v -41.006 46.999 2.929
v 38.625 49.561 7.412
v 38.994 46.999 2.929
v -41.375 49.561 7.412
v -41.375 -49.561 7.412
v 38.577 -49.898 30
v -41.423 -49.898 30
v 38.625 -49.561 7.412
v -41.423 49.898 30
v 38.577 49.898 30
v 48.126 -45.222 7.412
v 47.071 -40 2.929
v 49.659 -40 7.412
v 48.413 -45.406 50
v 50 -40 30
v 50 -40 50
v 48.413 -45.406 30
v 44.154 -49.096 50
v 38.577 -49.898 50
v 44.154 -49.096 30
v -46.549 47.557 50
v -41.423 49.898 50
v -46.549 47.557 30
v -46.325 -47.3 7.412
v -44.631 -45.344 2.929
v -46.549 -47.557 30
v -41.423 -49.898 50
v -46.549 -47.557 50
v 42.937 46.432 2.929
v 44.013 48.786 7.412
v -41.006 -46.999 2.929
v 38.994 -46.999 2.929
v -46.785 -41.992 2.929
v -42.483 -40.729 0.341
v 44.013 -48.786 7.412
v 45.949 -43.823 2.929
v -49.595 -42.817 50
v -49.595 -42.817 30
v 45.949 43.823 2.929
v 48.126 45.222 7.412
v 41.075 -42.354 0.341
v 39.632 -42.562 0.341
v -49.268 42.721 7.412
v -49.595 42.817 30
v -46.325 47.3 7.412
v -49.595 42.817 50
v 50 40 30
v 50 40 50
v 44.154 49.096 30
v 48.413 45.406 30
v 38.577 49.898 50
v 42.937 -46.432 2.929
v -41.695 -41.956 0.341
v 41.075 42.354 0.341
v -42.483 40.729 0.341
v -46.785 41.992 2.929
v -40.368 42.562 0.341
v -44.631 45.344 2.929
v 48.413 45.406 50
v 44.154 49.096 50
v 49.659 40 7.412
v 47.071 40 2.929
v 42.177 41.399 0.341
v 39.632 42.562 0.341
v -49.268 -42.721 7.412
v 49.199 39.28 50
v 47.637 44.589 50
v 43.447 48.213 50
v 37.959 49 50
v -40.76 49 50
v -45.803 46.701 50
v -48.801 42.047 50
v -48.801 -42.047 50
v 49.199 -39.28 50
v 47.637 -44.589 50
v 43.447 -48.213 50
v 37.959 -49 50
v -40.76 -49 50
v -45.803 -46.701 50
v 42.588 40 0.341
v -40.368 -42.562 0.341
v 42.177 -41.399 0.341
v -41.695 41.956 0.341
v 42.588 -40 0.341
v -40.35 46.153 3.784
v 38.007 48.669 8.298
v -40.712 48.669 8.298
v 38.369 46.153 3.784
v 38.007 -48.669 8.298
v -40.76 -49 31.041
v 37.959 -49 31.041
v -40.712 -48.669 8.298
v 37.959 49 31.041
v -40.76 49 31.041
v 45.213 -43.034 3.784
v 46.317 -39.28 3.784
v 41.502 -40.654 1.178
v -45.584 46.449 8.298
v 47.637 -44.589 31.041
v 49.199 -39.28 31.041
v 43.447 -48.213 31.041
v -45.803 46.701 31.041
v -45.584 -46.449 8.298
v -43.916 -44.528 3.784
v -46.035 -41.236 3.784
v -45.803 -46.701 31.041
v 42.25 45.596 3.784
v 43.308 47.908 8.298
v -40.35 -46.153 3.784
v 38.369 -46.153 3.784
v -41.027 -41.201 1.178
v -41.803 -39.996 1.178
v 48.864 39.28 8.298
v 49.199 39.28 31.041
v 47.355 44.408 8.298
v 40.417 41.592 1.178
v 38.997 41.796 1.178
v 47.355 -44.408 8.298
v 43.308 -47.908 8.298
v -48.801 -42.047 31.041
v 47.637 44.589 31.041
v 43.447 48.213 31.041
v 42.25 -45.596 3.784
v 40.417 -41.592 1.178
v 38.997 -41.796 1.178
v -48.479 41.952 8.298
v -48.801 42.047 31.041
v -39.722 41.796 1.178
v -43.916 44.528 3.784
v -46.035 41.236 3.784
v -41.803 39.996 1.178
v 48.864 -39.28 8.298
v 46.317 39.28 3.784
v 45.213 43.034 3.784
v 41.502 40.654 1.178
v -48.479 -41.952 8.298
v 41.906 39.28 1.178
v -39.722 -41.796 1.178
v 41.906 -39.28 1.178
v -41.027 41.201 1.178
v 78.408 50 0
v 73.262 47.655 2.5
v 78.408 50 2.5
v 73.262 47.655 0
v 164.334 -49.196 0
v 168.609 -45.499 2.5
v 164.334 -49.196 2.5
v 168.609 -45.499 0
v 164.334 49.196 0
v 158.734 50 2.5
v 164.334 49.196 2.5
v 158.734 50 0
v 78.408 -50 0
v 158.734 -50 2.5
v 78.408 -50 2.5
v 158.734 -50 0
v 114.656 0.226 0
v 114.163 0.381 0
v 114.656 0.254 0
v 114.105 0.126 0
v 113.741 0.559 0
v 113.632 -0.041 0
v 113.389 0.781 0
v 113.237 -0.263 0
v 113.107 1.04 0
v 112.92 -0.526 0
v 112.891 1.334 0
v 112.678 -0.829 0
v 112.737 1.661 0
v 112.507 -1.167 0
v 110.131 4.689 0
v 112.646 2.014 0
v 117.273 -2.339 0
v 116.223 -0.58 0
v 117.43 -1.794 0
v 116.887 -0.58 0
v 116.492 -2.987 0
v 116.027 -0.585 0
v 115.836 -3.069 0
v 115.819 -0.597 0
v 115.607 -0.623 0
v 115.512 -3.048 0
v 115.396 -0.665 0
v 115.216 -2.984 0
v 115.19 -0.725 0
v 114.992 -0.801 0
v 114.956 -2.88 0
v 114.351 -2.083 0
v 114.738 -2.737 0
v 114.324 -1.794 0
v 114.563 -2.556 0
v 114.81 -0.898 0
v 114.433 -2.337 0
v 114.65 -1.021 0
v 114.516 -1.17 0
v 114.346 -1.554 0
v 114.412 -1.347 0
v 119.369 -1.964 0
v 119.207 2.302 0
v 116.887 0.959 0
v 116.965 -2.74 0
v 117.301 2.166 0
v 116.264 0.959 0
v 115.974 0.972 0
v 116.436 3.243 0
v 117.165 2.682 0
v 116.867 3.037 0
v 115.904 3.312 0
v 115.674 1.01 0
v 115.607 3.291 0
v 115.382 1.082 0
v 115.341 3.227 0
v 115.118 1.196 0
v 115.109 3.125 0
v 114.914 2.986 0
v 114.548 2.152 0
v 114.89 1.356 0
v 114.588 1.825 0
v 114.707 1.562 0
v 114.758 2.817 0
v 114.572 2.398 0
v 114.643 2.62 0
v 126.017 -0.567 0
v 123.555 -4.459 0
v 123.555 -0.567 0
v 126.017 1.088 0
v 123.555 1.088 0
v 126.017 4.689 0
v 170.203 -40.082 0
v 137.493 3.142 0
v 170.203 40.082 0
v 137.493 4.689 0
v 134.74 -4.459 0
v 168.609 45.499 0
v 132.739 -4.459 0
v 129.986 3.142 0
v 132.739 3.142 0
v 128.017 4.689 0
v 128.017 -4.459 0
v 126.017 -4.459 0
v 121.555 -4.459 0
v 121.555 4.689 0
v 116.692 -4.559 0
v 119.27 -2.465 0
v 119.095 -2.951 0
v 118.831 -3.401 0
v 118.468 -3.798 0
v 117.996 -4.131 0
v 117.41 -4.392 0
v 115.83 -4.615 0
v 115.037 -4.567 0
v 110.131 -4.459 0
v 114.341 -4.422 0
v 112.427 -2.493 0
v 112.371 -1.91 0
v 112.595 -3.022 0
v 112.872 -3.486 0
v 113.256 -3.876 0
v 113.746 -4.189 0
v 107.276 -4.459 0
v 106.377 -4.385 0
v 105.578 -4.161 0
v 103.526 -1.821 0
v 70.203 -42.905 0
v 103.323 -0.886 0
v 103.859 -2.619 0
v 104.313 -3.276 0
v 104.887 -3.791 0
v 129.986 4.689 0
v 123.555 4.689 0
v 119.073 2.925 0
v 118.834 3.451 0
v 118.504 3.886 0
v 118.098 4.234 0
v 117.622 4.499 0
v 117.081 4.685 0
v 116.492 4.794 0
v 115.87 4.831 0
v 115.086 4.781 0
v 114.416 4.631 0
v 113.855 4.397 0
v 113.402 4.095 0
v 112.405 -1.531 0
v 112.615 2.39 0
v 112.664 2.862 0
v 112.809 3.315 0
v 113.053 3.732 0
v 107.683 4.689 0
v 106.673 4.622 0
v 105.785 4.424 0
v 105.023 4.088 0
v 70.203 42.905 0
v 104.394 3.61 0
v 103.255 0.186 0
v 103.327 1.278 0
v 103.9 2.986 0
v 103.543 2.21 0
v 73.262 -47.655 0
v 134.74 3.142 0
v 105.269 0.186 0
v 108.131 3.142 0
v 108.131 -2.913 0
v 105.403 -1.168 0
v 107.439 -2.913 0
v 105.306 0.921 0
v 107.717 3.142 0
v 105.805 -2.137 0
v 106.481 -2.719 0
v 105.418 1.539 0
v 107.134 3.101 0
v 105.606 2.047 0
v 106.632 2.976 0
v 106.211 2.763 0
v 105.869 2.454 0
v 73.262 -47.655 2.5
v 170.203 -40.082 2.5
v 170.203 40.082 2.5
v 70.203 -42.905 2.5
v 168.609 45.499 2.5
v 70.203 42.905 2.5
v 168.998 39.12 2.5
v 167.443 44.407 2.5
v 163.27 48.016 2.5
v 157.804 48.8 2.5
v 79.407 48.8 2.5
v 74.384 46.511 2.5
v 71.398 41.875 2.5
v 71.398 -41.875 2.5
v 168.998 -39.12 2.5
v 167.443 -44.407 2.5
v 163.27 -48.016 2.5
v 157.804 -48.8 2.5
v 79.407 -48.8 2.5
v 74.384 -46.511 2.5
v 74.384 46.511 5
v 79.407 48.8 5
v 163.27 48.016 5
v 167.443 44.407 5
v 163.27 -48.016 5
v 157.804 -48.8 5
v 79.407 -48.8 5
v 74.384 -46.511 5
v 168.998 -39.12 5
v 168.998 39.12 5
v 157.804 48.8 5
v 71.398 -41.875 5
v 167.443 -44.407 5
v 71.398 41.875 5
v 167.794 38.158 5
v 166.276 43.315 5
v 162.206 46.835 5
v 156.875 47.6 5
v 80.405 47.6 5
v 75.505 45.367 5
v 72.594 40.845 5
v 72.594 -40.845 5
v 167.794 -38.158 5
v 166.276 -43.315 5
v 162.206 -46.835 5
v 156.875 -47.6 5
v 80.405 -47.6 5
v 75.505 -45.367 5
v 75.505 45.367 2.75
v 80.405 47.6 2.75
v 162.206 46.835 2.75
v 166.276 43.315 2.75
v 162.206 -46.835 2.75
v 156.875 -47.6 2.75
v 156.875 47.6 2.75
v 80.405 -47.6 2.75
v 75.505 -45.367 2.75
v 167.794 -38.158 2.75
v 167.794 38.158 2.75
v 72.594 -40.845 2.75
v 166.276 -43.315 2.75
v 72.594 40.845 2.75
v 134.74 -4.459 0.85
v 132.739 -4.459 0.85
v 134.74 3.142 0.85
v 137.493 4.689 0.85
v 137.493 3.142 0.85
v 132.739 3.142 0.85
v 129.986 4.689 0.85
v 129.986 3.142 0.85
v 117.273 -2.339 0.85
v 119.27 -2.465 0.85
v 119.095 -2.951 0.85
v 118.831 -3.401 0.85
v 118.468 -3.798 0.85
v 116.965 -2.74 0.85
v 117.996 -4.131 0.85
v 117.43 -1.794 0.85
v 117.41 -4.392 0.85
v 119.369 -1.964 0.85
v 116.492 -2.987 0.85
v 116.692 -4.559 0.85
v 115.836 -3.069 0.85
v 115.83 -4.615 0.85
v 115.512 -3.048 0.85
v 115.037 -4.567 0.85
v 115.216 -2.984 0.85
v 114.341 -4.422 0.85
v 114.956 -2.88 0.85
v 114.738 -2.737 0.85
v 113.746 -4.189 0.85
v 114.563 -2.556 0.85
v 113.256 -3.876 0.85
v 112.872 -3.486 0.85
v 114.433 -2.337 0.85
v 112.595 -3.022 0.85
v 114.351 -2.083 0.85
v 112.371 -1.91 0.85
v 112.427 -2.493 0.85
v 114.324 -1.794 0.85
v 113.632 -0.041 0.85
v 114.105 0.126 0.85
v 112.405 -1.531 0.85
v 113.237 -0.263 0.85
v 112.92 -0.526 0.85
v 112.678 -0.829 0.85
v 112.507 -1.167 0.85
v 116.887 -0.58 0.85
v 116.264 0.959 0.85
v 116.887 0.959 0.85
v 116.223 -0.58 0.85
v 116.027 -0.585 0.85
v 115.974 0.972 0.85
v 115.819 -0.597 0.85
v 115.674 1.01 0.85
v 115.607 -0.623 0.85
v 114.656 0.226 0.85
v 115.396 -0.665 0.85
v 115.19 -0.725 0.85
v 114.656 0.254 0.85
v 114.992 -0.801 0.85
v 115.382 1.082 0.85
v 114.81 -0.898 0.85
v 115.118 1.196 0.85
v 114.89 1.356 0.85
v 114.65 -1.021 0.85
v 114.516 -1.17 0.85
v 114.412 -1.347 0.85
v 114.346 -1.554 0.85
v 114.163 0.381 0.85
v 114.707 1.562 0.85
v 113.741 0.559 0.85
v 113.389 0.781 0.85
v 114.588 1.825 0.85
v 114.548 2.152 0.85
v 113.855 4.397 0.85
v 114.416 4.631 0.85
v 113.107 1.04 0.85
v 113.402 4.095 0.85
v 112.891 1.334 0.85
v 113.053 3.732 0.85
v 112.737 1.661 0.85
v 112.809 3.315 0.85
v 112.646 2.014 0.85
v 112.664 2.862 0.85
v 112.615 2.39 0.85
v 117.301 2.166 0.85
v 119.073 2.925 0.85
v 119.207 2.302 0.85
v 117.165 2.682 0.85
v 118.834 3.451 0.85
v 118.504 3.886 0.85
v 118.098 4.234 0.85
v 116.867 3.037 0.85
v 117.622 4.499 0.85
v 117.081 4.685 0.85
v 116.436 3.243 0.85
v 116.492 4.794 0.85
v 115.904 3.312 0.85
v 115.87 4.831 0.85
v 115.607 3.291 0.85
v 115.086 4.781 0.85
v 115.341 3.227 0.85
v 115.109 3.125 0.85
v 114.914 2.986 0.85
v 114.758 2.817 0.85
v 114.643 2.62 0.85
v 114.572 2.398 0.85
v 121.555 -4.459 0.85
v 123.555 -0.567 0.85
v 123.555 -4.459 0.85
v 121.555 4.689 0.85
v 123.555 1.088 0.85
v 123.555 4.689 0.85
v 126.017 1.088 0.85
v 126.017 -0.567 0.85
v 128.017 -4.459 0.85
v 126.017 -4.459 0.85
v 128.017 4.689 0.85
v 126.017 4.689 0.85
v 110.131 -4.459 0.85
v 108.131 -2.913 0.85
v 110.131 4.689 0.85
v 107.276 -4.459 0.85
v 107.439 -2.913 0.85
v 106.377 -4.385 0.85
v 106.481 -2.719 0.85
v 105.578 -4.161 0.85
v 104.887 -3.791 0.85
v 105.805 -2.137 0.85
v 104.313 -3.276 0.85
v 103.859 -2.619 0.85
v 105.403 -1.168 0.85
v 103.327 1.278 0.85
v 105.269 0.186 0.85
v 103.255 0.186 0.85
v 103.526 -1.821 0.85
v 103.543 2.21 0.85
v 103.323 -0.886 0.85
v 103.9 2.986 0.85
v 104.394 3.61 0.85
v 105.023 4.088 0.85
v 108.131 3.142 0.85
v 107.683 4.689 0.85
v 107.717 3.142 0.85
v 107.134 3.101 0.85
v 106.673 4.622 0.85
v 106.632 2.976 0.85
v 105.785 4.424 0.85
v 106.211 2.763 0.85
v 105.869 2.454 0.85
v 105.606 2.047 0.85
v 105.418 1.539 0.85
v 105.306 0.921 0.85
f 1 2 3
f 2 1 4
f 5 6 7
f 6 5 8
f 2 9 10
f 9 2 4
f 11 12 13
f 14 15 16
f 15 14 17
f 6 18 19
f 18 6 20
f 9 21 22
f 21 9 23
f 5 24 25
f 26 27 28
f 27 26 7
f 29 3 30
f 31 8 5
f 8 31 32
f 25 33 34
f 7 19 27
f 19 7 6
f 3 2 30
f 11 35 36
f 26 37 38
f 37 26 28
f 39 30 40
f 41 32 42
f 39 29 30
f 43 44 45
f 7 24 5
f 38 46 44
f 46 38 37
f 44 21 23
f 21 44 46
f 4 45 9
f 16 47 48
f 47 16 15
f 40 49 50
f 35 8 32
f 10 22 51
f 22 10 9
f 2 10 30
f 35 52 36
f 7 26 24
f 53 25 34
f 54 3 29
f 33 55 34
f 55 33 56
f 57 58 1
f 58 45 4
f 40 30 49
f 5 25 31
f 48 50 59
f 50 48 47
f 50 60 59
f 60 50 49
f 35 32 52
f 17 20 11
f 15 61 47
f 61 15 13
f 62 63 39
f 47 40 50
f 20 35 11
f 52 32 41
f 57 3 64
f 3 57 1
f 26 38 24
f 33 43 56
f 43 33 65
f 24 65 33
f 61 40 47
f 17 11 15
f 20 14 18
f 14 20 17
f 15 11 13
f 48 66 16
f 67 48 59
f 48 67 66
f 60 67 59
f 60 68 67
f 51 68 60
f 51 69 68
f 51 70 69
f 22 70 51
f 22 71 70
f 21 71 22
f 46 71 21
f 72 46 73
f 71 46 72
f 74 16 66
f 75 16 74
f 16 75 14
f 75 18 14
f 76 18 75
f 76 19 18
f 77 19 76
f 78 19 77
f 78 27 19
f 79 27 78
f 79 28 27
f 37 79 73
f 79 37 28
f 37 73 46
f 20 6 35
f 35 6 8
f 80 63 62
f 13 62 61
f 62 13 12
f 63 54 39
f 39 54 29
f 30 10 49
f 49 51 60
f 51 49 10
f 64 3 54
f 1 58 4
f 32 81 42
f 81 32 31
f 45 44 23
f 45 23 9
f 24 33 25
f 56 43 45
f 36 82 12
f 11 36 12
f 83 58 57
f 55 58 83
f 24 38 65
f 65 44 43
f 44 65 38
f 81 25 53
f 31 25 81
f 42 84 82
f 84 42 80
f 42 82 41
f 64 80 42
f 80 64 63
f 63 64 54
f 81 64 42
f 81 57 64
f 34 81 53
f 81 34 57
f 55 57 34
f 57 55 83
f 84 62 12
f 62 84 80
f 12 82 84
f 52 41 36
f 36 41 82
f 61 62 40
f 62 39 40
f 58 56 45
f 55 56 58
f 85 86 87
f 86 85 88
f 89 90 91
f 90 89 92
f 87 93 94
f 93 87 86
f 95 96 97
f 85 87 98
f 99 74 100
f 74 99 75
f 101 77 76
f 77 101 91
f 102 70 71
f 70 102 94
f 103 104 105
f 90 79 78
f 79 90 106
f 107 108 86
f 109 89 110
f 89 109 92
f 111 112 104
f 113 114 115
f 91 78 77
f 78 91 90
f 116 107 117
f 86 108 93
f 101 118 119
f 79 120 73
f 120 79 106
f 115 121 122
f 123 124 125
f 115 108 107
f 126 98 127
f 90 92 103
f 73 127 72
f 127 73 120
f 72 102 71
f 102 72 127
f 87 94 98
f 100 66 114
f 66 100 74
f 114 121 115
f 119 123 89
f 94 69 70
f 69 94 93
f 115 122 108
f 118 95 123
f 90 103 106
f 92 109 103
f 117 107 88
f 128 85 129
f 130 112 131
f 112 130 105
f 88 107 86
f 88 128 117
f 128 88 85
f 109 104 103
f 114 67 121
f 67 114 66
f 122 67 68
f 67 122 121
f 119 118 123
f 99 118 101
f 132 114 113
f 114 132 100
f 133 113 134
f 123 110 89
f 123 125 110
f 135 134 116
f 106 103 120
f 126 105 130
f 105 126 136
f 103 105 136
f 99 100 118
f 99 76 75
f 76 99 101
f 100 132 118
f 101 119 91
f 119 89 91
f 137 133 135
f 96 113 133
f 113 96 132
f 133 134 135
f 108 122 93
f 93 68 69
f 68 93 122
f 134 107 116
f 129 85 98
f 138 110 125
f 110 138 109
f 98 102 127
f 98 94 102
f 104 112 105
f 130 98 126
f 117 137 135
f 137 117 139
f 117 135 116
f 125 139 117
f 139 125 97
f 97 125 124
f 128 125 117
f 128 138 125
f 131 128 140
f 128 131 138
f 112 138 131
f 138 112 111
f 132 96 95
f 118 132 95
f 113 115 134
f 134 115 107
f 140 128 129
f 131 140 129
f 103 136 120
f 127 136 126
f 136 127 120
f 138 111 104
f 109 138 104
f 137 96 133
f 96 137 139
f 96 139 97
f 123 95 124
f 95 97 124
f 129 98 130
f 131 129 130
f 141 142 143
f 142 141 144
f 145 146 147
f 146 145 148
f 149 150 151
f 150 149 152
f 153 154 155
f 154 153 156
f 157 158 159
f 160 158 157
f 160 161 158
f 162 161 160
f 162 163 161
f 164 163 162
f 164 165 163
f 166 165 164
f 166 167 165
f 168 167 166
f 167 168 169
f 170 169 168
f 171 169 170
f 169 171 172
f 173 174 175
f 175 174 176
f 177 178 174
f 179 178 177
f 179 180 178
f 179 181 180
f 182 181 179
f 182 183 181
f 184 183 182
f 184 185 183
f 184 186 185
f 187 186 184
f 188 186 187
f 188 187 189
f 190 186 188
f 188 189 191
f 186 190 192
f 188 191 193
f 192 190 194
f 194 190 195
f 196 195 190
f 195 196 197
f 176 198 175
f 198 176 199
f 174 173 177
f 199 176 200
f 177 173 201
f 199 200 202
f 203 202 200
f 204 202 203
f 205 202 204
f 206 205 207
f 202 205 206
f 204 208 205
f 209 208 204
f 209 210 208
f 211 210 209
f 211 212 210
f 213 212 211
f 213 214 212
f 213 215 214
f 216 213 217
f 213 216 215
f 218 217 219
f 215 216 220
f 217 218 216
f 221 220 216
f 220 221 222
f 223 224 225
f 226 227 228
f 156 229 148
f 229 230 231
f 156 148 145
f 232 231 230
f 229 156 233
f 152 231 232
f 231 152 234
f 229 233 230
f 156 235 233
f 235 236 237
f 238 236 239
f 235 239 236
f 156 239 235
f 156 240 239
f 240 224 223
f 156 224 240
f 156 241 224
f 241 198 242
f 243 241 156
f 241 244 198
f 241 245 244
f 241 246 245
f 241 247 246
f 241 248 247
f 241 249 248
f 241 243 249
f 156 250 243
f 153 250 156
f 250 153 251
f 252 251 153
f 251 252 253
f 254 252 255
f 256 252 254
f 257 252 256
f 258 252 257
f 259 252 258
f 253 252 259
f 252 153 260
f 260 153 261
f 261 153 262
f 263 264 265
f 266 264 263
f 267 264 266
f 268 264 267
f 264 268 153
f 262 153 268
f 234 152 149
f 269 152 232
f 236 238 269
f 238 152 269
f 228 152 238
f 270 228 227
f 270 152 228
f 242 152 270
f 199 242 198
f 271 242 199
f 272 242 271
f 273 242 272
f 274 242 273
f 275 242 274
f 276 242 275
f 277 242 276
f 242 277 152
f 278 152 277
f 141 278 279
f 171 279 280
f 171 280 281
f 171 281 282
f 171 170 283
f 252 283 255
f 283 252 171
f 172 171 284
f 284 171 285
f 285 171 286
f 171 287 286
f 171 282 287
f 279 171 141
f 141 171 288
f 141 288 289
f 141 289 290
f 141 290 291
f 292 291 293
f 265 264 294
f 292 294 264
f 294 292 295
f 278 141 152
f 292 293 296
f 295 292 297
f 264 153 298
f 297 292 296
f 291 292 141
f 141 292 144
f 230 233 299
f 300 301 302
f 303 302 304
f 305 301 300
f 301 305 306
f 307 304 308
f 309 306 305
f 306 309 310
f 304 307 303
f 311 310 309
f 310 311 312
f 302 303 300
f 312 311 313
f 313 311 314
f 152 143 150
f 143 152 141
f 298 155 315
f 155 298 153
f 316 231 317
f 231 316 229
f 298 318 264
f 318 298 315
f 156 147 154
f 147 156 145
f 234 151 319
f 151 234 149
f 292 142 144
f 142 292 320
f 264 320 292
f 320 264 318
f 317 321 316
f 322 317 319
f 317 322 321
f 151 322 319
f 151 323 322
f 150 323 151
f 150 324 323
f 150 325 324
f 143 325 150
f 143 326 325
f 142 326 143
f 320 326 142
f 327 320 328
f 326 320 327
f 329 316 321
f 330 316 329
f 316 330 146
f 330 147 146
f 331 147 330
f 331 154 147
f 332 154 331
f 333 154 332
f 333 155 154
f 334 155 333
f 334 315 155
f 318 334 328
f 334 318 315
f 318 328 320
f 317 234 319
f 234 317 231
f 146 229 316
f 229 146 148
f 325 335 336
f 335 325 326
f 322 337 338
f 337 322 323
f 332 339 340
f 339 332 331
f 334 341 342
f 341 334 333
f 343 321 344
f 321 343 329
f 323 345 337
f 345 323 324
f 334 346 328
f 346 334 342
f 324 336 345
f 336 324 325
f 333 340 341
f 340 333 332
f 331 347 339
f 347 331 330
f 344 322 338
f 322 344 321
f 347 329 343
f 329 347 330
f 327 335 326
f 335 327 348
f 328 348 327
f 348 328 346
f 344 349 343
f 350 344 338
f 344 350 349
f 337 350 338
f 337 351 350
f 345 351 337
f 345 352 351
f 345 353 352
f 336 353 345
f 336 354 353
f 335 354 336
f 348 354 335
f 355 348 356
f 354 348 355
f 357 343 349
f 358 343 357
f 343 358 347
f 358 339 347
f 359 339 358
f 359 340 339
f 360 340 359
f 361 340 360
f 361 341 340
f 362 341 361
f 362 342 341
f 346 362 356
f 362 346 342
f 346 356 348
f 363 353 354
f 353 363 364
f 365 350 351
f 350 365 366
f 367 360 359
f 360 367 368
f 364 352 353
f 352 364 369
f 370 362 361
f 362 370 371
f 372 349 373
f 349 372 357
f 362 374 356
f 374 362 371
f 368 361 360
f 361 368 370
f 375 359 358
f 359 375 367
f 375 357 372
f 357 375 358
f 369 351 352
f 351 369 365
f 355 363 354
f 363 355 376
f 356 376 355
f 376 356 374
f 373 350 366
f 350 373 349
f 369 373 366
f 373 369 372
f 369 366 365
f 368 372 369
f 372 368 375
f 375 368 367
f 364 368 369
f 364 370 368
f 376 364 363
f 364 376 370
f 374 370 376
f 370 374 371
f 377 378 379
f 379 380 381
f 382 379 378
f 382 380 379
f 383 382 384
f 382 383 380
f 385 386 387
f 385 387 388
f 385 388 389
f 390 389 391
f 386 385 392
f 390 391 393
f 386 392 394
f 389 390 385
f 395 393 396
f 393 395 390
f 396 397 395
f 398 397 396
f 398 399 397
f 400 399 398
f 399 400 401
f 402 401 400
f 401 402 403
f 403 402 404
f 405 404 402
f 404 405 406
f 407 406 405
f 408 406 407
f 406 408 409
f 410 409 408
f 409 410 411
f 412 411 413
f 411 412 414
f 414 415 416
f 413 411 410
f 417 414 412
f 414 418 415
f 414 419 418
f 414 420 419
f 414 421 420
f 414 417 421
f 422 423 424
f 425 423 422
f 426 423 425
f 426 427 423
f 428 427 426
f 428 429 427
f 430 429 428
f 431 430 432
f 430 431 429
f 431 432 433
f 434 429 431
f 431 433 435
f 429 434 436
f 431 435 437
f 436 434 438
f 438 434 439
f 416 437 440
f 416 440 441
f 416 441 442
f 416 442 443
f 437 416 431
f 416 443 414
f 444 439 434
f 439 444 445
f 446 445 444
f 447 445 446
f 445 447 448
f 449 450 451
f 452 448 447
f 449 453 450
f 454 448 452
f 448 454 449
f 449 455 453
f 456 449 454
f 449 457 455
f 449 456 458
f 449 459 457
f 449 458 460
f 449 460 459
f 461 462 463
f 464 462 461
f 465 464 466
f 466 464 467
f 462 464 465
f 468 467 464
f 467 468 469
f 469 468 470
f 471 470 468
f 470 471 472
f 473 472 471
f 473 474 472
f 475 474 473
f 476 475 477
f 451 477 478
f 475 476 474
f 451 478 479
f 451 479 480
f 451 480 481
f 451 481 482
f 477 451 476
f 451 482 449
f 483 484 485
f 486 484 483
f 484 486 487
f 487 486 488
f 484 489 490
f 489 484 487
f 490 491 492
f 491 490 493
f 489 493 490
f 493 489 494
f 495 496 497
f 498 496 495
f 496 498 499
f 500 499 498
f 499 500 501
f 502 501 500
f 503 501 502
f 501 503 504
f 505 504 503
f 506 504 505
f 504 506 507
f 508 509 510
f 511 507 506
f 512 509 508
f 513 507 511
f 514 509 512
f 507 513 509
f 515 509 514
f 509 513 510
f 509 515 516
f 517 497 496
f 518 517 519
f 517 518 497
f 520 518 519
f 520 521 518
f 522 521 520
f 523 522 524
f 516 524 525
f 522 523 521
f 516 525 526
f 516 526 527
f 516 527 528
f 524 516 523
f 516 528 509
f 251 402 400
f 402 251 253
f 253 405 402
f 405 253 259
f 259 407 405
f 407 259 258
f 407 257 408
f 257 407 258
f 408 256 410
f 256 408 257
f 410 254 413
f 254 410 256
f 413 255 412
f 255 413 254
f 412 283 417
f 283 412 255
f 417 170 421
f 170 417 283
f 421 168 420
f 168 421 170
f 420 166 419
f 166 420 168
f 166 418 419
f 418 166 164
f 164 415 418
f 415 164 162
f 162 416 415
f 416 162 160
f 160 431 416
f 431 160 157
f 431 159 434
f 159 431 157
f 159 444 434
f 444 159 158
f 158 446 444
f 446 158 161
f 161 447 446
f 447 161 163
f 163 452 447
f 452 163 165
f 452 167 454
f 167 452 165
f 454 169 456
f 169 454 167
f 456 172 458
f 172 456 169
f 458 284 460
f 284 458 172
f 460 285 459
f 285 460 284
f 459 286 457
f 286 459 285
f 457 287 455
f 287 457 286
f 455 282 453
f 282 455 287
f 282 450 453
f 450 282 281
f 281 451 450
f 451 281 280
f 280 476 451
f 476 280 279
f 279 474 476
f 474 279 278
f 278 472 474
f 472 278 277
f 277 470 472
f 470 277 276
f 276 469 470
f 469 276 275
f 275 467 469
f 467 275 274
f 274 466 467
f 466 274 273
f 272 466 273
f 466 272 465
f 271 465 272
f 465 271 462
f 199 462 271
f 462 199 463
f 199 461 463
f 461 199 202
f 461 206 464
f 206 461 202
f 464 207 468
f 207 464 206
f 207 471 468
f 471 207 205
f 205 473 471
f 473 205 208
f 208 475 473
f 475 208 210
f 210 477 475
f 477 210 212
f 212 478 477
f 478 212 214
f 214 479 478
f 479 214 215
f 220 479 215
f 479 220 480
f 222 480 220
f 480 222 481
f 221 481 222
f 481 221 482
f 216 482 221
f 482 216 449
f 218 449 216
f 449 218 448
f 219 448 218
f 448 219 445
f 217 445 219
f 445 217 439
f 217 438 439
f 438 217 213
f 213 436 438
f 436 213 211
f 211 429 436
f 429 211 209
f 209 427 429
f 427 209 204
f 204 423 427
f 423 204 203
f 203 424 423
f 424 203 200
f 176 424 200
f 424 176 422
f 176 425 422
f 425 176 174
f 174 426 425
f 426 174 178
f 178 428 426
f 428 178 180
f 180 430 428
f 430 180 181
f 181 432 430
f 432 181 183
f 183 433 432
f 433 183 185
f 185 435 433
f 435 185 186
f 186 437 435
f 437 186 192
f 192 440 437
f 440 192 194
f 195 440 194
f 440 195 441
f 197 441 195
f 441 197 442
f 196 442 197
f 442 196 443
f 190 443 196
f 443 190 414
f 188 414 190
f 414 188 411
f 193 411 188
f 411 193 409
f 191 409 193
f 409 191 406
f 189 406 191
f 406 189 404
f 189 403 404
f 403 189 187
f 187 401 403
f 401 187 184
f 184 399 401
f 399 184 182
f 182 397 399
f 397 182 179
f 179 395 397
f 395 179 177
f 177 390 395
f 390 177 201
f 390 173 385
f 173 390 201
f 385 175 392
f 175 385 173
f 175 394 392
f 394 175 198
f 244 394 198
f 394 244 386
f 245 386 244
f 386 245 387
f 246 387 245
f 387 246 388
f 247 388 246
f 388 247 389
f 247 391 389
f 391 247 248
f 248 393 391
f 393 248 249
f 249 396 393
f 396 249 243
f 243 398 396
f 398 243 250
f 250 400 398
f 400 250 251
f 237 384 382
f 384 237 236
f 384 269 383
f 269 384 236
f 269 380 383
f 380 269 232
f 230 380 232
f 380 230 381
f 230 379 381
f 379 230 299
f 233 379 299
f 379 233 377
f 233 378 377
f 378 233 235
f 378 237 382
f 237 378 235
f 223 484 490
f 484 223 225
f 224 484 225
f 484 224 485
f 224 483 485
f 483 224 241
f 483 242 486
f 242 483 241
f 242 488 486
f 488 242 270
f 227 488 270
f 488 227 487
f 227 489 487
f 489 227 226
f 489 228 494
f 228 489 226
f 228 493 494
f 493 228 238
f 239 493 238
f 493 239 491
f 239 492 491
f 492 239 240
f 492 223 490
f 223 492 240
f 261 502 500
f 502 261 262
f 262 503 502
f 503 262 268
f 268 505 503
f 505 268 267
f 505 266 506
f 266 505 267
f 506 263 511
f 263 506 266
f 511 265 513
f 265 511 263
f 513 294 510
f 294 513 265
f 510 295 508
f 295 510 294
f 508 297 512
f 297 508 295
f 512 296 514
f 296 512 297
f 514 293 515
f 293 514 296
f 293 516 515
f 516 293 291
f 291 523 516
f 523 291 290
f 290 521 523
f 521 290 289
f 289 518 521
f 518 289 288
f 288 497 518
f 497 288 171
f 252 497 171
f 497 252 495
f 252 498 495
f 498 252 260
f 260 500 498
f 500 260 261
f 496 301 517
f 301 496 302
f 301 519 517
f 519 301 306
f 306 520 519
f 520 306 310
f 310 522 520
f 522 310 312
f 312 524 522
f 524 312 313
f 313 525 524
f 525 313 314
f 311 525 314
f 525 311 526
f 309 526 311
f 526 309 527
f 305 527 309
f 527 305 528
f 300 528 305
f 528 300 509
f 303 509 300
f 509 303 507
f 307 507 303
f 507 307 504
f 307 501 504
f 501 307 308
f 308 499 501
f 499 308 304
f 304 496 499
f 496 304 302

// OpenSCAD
/* [Box Dimensions] */

edge_style = 1; // [1: Rounded, 0: Sharp]

detail = 5; // [1,2,3,4,5,6,7,8,9,10]
$fs = 11 - detail;

// Width
box_width = 100;

// Depth
box_depth = 100;

// Height
box_height = 50;

// Corner radius
radius = 10;

// Wall Thickness
box_thickness = 1;

// Show Box, Lid or both
toggle_display =  0; // [0:Both, 1:Box, 2:Lid]




/* [Lid] */

// Lid Height
lid_height = 5;

// Lid Tolerance
lid_tolerance = 0.2;

// Optional Lid Text
lid_text = "TH3D";

// Text Size
lid_text_size = 10;

// Font
lid_text_font = "Liberation Mono"; // [Liberation Mono, Liberation Sans, Liberation Sans Narrow, Liberation Serif]

lid_text_style = "Bold"; // [Bold, Italic, Bold Italic, Regular]

lid_text_spacing = 1.1;


/* [Hidden] */
box_radius = min(box_width/3,box_height/3,box_depth/3, radius);

box_size = [box_width,box_depth,box_height];
lid_size = [box_width, box_depth, lid_height];

if(toggle_display != 2) Box(size=box_size, radius=box_radius, wallWidth=box_thickness);
translate([toggle_display!=2 ? box_width*1.2 : 0,0,0]) if(toggle_display!=1) Lid(size=lid_size, wallWidth=box_thickness, radius=box_radius, tolerance=lid_tolerance);
    

module my_cube(size, radius, center, apply_to){
    if(edge_style){
        roundedcube(size=size,radius=radius,center=center,apply_to=apply_to);
    } else {
        cube(size=size,center=center);
    }
}

module Lid(size=[100,50,5], wallWidth=1, radius=5, tolerance=1){
    dw = (wallWidth+tolerance)*2;
    qw = (wallWidth+tolerance)*4;
    translate([0,0,size[2]/2/2])
    difference(){
        union(){
            resize([size[0],size[1],size[2]*0.5])
            my_cube(size=size, radius=radius, apply_to="z", center=true);
            translate([0,0,size[2]*0.5])
            resize([size[0]-dw,size[1]-dw,size[2]*0.5])
            my_cube(size=size, radius=radius, apply_to="z", center=true);
        }
        translate([0,0,size[2]*0.55])
        resize([size[0]-qw,size[1]-qw,size[2]/2])
        my_cube(size=size, radius=radius, apply_to="z", center=true);
        translate([0,0,-1.4])
        scale([-1,1,1])
        linear_extrude(height = 1){
            text(lid_text, lid_text_size, str(lid_text_font,":style=",lid_text_style), halign="center", valign="center", spacing=lid_text_spacing);
        }
    }
}

module Box(size=[100,50,30], wallWidth=1, radius=5){
    dw = wallWidth*2;
    translate([0,0,size[2]/2])
    difference(){
        my_cube(size=size, radius=radius, apply_to="zmin", center=true);
        resize([size[0]-dw,size[1]-dw,size[2]])
        translate([0,0,wallWidth])
            my_cube(size=size, radius=radius, apply_to="zmin", center=true);
    }
    
}

module roundedcube(size = [1, 1, 1], center = false, radius = 0.5, apply_to = "all") {
	// If single value, convert to [x, y, z] vector
	size = (size[0] == undef) ? [size, size, size] : size;

	translate_min = radius;
	translate_xmax = size[0] - radius;
	translate_ymax = size[1] - radius;
	translate_zmax = size[2] - radius;

	diameter = radius * 2;

	obj_translate = (center == false) ?
		[0, 0, 0] : [
			-(size[0] / 2),
			-(size[1] / 2),
			-(size[2] / 2)
		];

	translate(v = obj_translate) {
		hull() {
			for (translate_x = [translate_min, translate_xmax]) {
				x_at = (translate_x == translate_min) ? "min" : "max";
				for (translate_y = [translate_min, translate_ymax]) {
					y_at = (translate_y == translate_min) ? "min" : "max";
					for (translate_z = [translate_min, translate_zmax]) {
						z_at = (translate_z == translate_min) ? "min" : "max";

						translate(v = [translate_x, translate_y, translate_z])
						if (
							(apply_to == "all") ||
							(apply_to == "xmin" && x_at == "min") || (apply_to == "xmax" && x_at == "max") ||
							(apply_to == "ymin" && y_at == "min") || (apply_to == "ymax" && y_at == "max") ||
							(apply_to == "zmin" && z_at == "min") || (apply_to == "zmax" && z_at == "max")
						) {
							sphere(r = radius);
						} else {
							rotate = 
								(apply_to == "xmin" || apply_to == "xmax" || apply_to == "x") ? [0, 90, 0] : (
								(apply_to == "ymin" || apply_to == "ymax" || apply_to == "y") ? [90, 90, 0] :
								[0, 0, 0]
							);
							rotate(a = rotate)
							cylinder(h = diameter, r = radius, center = true);
						}
					}
				}
			}
		}
	}
}
